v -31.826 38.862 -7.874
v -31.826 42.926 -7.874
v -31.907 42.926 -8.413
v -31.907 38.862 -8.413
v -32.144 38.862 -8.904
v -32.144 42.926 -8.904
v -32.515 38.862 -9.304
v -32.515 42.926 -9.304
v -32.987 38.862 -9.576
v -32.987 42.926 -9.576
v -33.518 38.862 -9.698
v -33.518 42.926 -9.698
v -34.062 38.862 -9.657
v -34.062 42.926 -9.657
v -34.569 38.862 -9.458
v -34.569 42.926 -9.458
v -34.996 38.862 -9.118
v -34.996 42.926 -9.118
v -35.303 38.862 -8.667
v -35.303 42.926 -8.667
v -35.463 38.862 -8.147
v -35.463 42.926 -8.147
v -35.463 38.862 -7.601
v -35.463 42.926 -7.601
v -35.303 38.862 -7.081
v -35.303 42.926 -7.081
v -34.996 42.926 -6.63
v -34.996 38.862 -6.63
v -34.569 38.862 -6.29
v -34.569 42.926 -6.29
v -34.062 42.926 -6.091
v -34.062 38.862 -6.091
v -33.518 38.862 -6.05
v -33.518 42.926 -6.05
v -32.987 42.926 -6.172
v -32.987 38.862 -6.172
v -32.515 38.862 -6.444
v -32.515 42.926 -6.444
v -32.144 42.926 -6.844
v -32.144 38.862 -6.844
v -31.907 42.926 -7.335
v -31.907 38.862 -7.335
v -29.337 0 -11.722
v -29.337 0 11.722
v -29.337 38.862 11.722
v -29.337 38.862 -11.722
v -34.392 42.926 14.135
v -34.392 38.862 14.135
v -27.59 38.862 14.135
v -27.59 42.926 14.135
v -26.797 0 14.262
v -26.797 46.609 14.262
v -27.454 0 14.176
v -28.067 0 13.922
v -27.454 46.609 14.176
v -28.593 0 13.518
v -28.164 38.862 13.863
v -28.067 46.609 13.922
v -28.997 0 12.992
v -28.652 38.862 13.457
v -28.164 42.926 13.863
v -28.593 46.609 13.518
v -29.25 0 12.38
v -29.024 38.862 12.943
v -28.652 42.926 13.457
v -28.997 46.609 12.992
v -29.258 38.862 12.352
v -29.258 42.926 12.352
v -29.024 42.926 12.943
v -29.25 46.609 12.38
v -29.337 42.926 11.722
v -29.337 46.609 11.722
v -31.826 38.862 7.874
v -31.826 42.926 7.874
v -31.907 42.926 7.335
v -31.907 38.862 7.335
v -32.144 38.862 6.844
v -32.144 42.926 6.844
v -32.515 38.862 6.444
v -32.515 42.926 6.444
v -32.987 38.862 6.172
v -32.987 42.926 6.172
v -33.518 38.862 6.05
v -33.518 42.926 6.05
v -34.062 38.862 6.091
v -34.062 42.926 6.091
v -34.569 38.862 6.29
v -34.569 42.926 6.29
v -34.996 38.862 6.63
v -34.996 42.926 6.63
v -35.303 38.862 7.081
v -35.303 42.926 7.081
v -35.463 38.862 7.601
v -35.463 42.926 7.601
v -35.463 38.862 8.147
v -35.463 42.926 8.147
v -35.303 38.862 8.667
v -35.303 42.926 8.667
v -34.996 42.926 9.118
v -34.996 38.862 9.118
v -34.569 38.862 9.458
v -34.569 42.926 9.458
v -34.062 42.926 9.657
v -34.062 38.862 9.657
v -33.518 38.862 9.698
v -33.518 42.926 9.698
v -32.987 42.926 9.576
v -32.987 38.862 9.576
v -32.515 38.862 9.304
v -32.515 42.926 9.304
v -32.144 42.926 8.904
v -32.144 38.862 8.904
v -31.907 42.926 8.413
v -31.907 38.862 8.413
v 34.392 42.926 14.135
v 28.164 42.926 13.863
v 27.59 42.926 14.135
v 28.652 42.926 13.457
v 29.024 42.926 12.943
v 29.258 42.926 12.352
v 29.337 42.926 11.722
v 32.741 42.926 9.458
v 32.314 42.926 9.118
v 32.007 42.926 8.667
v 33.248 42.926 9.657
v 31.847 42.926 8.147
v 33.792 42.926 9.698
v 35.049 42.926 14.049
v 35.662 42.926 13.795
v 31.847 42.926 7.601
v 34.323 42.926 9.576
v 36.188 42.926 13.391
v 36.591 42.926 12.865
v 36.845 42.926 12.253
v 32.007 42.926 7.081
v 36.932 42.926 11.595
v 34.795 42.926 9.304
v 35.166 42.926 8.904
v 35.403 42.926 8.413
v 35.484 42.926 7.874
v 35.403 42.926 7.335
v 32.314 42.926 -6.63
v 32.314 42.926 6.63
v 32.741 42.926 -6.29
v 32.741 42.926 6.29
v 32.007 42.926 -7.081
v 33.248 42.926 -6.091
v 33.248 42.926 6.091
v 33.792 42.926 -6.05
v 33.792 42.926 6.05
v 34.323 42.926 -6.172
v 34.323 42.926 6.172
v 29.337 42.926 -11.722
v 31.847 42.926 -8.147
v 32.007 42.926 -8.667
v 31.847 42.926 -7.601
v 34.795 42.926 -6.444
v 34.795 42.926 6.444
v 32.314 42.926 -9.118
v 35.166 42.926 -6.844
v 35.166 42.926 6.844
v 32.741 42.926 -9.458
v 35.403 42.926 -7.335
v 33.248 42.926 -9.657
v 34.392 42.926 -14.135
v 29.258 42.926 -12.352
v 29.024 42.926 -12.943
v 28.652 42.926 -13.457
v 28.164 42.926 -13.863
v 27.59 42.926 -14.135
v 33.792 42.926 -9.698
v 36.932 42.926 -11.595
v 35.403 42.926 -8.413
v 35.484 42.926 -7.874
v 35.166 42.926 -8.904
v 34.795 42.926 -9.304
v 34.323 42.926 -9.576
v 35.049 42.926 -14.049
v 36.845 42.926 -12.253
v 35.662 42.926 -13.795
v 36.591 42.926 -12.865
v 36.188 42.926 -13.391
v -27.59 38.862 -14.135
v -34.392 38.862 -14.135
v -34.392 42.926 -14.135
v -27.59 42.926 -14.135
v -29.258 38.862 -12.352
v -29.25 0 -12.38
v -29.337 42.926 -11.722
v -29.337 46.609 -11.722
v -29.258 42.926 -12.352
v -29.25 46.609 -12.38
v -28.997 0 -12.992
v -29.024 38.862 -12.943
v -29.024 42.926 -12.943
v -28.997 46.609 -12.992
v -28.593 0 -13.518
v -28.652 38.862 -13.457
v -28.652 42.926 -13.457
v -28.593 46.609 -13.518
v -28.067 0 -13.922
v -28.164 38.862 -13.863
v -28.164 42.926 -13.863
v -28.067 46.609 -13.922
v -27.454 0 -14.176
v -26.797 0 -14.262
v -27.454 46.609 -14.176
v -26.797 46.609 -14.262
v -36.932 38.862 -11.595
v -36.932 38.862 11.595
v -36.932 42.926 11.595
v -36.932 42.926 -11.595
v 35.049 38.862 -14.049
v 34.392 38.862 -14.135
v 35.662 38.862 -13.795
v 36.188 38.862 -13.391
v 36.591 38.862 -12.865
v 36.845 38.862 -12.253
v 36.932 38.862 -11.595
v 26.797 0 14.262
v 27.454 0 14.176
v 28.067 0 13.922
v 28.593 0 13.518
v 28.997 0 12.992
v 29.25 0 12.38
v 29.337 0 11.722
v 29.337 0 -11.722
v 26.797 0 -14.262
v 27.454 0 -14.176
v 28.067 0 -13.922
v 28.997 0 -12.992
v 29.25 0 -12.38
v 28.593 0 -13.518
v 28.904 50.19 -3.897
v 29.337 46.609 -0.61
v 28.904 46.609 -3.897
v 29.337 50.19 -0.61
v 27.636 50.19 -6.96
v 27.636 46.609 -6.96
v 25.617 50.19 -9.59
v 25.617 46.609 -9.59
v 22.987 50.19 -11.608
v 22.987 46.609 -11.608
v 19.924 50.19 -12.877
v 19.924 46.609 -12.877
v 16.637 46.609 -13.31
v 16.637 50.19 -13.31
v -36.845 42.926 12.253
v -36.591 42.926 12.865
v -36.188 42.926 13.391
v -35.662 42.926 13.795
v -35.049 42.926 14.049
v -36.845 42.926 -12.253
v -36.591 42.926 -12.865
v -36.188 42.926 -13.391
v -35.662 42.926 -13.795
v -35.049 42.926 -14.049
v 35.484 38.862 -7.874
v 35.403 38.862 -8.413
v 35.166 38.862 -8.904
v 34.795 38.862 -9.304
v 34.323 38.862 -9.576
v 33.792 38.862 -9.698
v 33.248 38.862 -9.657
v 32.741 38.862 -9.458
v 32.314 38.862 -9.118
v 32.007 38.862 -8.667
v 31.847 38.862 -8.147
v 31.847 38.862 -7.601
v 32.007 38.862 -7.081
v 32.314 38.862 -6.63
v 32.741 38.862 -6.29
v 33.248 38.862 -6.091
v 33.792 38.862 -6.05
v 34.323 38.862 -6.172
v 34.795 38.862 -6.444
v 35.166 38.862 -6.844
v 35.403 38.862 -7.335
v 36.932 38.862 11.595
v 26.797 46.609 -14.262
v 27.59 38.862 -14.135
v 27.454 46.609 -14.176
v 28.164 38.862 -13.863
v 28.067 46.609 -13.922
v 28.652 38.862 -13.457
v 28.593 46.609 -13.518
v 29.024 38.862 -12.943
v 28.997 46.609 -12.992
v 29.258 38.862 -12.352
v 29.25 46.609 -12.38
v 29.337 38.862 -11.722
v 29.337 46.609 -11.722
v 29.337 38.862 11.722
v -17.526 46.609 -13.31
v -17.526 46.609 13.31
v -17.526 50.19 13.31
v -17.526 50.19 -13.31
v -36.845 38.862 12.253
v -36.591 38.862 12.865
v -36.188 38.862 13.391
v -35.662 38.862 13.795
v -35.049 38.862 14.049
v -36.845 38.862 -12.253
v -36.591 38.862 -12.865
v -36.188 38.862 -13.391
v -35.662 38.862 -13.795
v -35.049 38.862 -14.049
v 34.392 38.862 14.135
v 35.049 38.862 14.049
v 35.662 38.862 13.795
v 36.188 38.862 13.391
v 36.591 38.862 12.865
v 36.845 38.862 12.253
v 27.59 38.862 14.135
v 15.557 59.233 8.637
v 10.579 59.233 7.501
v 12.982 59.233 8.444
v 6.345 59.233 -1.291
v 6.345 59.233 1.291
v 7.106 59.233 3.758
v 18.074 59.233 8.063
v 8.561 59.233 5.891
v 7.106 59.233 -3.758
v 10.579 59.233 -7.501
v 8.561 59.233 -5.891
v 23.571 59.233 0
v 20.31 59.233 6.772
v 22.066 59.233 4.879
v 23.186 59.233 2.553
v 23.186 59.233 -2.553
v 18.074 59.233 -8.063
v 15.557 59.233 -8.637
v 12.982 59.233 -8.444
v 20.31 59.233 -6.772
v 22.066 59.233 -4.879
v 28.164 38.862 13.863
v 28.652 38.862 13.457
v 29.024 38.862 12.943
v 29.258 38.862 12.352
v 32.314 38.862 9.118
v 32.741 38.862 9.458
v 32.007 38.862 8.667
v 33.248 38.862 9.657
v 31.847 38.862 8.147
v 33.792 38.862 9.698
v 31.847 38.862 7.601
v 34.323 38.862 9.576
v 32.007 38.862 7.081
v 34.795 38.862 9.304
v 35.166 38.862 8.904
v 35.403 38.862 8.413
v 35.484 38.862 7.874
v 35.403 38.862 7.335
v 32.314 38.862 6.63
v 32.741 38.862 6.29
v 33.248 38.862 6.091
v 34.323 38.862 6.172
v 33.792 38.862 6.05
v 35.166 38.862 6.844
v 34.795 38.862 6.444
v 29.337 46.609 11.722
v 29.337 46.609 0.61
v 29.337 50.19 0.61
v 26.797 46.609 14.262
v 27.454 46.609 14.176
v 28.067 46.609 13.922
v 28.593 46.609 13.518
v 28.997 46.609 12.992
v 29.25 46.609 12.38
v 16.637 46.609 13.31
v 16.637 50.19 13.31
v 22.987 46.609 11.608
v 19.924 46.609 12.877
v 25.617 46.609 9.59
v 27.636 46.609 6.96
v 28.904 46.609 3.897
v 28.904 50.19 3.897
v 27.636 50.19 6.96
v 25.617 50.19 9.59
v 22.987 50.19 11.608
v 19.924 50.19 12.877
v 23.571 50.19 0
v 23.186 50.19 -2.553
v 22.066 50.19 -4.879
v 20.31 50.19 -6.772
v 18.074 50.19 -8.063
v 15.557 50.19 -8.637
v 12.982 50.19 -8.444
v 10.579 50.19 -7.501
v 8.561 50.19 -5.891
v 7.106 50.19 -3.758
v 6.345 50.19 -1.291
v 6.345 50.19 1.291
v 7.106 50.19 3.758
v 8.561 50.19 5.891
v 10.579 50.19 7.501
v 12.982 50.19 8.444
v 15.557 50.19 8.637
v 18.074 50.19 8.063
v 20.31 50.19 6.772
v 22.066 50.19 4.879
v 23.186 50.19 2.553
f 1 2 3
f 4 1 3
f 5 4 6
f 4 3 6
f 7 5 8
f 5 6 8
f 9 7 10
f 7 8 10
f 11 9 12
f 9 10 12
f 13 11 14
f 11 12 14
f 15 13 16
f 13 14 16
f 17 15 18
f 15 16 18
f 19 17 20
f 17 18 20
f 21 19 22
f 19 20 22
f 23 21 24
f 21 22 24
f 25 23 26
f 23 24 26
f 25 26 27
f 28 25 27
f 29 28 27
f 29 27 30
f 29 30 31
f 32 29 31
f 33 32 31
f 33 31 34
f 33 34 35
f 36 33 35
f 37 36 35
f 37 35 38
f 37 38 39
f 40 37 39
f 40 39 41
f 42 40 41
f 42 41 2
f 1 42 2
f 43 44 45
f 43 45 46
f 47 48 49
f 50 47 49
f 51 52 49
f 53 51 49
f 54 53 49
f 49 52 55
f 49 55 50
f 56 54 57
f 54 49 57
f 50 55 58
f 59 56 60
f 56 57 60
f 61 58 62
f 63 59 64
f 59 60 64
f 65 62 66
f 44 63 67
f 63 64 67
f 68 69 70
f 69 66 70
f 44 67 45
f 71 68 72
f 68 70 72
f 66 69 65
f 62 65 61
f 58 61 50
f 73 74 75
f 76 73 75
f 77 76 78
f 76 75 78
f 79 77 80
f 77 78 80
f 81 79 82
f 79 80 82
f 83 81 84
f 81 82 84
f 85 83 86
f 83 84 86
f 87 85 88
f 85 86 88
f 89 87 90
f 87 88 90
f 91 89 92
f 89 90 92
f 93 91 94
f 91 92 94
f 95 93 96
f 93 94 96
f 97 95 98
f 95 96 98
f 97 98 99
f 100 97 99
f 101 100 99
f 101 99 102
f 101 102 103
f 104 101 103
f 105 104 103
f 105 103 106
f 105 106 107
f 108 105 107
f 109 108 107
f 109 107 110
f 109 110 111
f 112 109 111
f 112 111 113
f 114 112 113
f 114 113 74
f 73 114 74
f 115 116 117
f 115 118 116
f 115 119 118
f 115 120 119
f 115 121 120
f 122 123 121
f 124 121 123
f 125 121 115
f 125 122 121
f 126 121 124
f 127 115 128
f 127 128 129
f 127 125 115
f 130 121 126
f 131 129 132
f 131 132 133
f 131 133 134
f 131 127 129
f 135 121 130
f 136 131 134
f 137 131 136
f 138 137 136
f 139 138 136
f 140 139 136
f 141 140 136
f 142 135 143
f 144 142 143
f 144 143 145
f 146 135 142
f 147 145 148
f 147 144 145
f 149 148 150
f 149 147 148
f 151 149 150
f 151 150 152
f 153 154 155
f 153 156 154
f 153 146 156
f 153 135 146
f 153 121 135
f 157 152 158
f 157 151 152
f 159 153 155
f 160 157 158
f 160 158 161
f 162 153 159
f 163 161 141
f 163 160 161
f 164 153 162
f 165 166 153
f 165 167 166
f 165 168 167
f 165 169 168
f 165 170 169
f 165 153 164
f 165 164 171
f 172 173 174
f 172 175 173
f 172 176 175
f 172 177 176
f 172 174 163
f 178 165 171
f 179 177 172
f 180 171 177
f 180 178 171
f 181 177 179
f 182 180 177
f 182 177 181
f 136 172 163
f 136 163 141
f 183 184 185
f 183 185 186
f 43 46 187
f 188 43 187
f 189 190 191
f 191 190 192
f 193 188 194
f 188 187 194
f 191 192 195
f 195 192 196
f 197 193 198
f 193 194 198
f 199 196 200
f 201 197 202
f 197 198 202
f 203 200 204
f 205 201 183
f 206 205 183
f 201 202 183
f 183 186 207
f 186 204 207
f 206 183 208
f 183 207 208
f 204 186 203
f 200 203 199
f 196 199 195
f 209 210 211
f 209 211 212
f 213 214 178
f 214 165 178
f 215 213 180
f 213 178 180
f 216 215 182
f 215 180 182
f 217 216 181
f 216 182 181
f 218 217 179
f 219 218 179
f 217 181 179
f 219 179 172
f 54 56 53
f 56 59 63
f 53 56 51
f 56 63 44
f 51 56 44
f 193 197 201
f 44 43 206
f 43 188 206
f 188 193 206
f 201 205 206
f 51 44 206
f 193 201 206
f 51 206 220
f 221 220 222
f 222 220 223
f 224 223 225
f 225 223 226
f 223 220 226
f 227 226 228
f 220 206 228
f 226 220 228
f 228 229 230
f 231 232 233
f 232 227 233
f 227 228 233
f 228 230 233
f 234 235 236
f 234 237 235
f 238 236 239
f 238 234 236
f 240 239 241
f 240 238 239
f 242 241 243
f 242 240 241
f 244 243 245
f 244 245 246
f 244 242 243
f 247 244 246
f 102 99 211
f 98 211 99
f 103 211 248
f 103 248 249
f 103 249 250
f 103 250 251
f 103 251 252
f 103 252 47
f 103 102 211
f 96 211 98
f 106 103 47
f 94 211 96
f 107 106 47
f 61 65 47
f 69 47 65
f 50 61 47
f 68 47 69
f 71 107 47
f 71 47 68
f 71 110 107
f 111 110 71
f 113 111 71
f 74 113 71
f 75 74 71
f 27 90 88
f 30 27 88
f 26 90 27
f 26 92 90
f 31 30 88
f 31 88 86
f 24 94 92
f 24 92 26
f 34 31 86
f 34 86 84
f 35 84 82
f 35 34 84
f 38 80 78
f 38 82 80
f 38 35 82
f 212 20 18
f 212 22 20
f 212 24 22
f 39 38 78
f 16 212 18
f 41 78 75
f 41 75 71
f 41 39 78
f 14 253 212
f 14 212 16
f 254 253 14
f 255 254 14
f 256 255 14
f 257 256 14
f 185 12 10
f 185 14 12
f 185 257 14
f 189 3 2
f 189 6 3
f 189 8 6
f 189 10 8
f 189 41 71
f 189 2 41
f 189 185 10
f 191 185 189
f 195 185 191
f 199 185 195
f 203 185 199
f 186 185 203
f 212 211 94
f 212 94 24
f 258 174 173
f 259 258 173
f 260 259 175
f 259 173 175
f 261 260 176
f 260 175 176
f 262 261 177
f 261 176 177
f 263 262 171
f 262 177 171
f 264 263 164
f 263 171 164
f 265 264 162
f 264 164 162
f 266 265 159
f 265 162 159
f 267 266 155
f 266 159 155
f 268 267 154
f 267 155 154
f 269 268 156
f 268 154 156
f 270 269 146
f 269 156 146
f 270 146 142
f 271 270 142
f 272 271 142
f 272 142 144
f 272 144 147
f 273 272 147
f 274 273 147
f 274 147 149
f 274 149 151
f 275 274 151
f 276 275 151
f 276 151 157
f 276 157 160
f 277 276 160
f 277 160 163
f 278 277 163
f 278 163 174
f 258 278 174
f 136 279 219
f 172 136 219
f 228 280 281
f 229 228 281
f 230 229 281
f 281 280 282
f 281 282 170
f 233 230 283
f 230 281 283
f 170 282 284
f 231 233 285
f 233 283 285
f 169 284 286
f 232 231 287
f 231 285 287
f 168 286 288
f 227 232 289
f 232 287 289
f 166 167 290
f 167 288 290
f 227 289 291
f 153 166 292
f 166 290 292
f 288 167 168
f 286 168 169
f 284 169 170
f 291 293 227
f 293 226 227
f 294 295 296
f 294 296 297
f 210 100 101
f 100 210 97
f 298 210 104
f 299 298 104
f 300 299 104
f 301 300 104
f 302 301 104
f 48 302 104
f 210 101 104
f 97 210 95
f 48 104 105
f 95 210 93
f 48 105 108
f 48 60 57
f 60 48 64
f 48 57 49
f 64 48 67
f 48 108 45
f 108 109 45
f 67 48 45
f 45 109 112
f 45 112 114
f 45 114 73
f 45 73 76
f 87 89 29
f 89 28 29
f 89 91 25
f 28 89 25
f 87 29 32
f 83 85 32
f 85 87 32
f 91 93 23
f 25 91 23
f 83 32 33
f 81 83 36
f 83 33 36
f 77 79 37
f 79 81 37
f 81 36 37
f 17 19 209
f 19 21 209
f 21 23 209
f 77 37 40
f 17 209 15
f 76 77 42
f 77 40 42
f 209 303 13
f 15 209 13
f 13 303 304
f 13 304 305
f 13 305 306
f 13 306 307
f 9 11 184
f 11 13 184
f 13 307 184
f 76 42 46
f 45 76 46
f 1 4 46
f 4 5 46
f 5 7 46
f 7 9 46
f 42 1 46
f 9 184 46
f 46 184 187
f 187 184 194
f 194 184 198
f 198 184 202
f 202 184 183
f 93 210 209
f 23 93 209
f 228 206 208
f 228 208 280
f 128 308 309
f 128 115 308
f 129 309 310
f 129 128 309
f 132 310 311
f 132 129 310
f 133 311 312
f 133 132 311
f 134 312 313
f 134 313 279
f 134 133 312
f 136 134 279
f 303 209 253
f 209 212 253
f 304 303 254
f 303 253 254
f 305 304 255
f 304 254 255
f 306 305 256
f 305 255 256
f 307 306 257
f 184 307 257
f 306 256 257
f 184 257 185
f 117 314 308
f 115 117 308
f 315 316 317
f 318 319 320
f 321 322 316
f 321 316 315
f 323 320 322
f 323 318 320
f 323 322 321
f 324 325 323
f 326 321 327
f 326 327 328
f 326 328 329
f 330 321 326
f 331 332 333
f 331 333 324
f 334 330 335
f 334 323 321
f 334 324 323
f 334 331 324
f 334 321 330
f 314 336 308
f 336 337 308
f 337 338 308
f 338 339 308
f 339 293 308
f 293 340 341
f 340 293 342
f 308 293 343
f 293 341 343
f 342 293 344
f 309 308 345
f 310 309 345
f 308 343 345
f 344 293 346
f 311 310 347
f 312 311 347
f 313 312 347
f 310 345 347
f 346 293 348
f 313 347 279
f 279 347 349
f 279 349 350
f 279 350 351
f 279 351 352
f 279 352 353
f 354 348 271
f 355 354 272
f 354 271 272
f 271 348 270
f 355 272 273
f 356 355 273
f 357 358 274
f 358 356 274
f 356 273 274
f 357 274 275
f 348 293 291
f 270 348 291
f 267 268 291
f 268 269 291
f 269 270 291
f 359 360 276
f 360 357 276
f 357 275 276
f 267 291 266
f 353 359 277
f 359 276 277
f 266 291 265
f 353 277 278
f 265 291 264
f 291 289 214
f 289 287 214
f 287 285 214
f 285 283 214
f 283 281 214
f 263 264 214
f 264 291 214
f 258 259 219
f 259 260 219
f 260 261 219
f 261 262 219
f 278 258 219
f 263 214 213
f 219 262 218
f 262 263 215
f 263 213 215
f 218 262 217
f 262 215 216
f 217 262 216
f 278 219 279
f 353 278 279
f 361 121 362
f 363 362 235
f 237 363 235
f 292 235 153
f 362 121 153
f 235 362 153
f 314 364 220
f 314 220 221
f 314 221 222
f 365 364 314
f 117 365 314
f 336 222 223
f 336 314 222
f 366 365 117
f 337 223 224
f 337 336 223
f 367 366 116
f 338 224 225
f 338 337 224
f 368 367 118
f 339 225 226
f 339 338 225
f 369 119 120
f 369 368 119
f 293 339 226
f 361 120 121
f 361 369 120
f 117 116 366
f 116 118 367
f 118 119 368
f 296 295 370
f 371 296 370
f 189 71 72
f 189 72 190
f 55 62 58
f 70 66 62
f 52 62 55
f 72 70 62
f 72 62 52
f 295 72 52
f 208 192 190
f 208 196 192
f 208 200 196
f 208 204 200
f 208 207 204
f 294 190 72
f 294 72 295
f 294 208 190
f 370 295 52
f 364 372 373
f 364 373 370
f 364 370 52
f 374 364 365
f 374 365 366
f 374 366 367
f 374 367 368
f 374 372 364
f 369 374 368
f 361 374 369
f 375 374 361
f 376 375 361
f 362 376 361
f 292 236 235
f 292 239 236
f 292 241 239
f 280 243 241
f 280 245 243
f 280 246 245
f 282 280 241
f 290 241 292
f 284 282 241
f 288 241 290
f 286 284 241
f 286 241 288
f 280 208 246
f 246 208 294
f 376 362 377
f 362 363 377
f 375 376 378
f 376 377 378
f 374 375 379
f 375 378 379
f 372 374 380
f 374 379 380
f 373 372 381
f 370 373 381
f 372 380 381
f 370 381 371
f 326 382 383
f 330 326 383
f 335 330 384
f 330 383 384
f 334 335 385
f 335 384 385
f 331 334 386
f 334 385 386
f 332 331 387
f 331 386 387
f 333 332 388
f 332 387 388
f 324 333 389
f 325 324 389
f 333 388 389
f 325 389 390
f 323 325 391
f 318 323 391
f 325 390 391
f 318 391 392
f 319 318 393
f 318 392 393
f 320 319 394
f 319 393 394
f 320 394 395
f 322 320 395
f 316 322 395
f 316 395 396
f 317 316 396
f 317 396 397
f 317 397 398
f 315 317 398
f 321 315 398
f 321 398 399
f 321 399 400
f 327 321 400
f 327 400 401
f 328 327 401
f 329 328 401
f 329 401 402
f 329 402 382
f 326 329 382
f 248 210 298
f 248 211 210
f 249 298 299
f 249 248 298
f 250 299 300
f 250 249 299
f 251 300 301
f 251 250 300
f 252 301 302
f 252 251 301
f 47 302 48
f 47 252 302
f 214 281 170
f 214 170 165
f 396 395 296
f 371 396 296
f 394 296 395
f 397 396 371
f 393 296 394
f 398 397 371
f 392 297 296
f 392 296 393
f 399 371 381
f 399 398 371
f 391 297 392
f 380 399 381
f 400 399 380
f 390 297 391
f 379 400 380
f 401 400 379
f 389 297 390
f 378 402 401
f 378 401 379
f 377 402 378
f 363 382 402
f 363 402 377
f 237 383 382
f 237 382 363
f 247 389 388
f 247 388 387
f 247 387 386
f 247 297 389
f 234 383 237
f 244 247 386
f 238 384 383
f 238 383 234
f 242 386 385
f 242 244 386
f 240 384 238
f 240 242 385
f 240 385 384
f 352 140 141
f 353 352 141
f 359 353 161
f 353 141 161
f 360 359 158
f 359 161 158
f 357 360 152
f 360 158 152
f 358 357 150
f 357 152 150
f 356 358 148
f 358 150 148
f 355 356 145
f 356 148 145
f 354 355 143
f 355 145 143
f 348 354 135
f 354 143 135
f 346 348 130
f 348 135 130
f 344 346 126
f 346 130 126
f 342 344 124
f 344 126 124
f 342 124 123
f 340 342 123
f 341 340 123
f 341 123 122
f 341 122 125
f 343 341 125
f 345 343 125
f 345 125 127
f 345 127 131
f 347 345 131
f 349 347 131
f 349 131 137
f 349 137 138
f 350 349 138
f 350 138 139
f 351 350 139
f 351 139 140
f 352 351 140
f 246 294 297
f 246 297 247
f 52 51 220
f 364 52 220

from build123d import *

# Parameters (mm, degrees)
SKETCH1_W           = 58.674
SKETCH1_H           = 28.5242
BOSS_EXTRUDE1_DEPTH = 46.609
SKETCH2_W           = 46.863
SKETCH2_H           = 26.6192
BOSS_EXTRUDE2_DEPTH = 3.5814
FILLET1_R           = 12.7
FILLET2_R           = 2.54
BOSS_EXTRUDE3_START = -7.747
SKETCH3_W           = 73.8632
SKETCH3_H           = 28.2702
BOSS_EXTRUDE3_DEPTH = 4.064
FILLET3_R           = 2.54
SKETCH4_R           = 1.8288
CUT_EXTRUDE1_DEPTH  = 43.926
SKETCH5_R           = 8.6614
BOSS_EXTRUDE4_DEPTH = 12.6238


with BuildPart() as part:
    # Sketch1 → Boss-Extrude1 (new body)
    with BuildSketch(Plane(origin=(0, 0, 0), x_dir=(1, 0, 0), z_dir=(0, 1, 0))):
        Rectangle(SKETCH1_W, SKETCH1_H)
    extrude(amount=BOSS_EXTRUDE1_DEPTH)

    # Sketch2 → Boss-Extrude2 (add)
    with BuildSketch(Plane(origin=(0, 46.609, 0), x_dir=(1, 0, 0), z_dir=(0, 1, 0))):
        with Locations((5.9055, 0)):
            Rectangle(SKETCH2_W, SKETCH2_H)
    extrude(amount=BOSS_EXTRUDE2_DEPTH)

    # Fillet1
    fillet1_edges = [part.edges().sort_by_distance(p)[0] for p in [
        (29.337, 48.3997, 13.3096),
        (29.337, 48.3997, -13.3096),
    ]]
    fillet(fillet1_edges, radius=FILLET1_R)

    # Fillet2
    fillet2_edges = [part.edges().sort_by_distance(p)[0] for p in [
        (29.337, 23.3045, 14.2621),
        (29.337, 23.3045, -14.2621),
        (-29.337, 23.3045, -14.2621),
        (-29.337, 23.3045, 14.2621),
    ]]
    fillet(fillet2_edges, radius=FILLET2_R)

    # Sketch3 → Boss-Extrude3 (add)
    with BuildSketch(Plane(origin=(0, 46.609, 0), x_dir=(1, 0, 0), z_dir=(0, 1, 0)).offset(BOSS_EXTRUDE3_START)):
        Rectangle(SKETCH3_W, SKETCH3_H)
    extrude(amount=BOSS_EXTRUDE3_DEPTH)

    # Fillet3
    fillet3_edges = [part.edges().sort_by_distance(p)[0] for p in [
        (36.9316, 40.894, -14.1351),
        (-36.9316, 40.894, -14.1351),
        (-36.9316, 40.894, 14.1351),
        (36.9316, 40.894, 14.1351),
    ]]
    fillet(fillet3_edges, radius=FILLET3_R)

    # Sketch4 → Cut-Extrude1 (cut, through all)
    with BuildSketch(Plane(origin=(0, 42.926, 0), x_dir=(1, 0, 0), z_dir=(0, 1, 0))):
        with Locations((-33.655, 7.874)):
            Circle(SKETCH4_R)
        with Locations((-33.655, -7.874)):
            Circle(SKETCH4_R)
        with Locations((33.655, -7.874)):
            Circle(SKETCH4_R)
        with Locations((33.655, 7.874)):
            Circle(SKETCH4_R)
    extrude(amount=-CUT_EXTRUDE1_DEPTH, mode=Mode.SUBTRACT)

    # Sketch5 → Boss-Extrude4 (add)
    with BuildSketch(Plane(origin=(0, 46.609, 0), x_dir=(1, 0, 0), z_dir=(0, 1, 0))):
        with Locations((14.9098, 0)):
            Circle(SKETCH5_R)
    extrude(amount=BOSS_EXTRUDE4_DEPTH)


solid = part.part
